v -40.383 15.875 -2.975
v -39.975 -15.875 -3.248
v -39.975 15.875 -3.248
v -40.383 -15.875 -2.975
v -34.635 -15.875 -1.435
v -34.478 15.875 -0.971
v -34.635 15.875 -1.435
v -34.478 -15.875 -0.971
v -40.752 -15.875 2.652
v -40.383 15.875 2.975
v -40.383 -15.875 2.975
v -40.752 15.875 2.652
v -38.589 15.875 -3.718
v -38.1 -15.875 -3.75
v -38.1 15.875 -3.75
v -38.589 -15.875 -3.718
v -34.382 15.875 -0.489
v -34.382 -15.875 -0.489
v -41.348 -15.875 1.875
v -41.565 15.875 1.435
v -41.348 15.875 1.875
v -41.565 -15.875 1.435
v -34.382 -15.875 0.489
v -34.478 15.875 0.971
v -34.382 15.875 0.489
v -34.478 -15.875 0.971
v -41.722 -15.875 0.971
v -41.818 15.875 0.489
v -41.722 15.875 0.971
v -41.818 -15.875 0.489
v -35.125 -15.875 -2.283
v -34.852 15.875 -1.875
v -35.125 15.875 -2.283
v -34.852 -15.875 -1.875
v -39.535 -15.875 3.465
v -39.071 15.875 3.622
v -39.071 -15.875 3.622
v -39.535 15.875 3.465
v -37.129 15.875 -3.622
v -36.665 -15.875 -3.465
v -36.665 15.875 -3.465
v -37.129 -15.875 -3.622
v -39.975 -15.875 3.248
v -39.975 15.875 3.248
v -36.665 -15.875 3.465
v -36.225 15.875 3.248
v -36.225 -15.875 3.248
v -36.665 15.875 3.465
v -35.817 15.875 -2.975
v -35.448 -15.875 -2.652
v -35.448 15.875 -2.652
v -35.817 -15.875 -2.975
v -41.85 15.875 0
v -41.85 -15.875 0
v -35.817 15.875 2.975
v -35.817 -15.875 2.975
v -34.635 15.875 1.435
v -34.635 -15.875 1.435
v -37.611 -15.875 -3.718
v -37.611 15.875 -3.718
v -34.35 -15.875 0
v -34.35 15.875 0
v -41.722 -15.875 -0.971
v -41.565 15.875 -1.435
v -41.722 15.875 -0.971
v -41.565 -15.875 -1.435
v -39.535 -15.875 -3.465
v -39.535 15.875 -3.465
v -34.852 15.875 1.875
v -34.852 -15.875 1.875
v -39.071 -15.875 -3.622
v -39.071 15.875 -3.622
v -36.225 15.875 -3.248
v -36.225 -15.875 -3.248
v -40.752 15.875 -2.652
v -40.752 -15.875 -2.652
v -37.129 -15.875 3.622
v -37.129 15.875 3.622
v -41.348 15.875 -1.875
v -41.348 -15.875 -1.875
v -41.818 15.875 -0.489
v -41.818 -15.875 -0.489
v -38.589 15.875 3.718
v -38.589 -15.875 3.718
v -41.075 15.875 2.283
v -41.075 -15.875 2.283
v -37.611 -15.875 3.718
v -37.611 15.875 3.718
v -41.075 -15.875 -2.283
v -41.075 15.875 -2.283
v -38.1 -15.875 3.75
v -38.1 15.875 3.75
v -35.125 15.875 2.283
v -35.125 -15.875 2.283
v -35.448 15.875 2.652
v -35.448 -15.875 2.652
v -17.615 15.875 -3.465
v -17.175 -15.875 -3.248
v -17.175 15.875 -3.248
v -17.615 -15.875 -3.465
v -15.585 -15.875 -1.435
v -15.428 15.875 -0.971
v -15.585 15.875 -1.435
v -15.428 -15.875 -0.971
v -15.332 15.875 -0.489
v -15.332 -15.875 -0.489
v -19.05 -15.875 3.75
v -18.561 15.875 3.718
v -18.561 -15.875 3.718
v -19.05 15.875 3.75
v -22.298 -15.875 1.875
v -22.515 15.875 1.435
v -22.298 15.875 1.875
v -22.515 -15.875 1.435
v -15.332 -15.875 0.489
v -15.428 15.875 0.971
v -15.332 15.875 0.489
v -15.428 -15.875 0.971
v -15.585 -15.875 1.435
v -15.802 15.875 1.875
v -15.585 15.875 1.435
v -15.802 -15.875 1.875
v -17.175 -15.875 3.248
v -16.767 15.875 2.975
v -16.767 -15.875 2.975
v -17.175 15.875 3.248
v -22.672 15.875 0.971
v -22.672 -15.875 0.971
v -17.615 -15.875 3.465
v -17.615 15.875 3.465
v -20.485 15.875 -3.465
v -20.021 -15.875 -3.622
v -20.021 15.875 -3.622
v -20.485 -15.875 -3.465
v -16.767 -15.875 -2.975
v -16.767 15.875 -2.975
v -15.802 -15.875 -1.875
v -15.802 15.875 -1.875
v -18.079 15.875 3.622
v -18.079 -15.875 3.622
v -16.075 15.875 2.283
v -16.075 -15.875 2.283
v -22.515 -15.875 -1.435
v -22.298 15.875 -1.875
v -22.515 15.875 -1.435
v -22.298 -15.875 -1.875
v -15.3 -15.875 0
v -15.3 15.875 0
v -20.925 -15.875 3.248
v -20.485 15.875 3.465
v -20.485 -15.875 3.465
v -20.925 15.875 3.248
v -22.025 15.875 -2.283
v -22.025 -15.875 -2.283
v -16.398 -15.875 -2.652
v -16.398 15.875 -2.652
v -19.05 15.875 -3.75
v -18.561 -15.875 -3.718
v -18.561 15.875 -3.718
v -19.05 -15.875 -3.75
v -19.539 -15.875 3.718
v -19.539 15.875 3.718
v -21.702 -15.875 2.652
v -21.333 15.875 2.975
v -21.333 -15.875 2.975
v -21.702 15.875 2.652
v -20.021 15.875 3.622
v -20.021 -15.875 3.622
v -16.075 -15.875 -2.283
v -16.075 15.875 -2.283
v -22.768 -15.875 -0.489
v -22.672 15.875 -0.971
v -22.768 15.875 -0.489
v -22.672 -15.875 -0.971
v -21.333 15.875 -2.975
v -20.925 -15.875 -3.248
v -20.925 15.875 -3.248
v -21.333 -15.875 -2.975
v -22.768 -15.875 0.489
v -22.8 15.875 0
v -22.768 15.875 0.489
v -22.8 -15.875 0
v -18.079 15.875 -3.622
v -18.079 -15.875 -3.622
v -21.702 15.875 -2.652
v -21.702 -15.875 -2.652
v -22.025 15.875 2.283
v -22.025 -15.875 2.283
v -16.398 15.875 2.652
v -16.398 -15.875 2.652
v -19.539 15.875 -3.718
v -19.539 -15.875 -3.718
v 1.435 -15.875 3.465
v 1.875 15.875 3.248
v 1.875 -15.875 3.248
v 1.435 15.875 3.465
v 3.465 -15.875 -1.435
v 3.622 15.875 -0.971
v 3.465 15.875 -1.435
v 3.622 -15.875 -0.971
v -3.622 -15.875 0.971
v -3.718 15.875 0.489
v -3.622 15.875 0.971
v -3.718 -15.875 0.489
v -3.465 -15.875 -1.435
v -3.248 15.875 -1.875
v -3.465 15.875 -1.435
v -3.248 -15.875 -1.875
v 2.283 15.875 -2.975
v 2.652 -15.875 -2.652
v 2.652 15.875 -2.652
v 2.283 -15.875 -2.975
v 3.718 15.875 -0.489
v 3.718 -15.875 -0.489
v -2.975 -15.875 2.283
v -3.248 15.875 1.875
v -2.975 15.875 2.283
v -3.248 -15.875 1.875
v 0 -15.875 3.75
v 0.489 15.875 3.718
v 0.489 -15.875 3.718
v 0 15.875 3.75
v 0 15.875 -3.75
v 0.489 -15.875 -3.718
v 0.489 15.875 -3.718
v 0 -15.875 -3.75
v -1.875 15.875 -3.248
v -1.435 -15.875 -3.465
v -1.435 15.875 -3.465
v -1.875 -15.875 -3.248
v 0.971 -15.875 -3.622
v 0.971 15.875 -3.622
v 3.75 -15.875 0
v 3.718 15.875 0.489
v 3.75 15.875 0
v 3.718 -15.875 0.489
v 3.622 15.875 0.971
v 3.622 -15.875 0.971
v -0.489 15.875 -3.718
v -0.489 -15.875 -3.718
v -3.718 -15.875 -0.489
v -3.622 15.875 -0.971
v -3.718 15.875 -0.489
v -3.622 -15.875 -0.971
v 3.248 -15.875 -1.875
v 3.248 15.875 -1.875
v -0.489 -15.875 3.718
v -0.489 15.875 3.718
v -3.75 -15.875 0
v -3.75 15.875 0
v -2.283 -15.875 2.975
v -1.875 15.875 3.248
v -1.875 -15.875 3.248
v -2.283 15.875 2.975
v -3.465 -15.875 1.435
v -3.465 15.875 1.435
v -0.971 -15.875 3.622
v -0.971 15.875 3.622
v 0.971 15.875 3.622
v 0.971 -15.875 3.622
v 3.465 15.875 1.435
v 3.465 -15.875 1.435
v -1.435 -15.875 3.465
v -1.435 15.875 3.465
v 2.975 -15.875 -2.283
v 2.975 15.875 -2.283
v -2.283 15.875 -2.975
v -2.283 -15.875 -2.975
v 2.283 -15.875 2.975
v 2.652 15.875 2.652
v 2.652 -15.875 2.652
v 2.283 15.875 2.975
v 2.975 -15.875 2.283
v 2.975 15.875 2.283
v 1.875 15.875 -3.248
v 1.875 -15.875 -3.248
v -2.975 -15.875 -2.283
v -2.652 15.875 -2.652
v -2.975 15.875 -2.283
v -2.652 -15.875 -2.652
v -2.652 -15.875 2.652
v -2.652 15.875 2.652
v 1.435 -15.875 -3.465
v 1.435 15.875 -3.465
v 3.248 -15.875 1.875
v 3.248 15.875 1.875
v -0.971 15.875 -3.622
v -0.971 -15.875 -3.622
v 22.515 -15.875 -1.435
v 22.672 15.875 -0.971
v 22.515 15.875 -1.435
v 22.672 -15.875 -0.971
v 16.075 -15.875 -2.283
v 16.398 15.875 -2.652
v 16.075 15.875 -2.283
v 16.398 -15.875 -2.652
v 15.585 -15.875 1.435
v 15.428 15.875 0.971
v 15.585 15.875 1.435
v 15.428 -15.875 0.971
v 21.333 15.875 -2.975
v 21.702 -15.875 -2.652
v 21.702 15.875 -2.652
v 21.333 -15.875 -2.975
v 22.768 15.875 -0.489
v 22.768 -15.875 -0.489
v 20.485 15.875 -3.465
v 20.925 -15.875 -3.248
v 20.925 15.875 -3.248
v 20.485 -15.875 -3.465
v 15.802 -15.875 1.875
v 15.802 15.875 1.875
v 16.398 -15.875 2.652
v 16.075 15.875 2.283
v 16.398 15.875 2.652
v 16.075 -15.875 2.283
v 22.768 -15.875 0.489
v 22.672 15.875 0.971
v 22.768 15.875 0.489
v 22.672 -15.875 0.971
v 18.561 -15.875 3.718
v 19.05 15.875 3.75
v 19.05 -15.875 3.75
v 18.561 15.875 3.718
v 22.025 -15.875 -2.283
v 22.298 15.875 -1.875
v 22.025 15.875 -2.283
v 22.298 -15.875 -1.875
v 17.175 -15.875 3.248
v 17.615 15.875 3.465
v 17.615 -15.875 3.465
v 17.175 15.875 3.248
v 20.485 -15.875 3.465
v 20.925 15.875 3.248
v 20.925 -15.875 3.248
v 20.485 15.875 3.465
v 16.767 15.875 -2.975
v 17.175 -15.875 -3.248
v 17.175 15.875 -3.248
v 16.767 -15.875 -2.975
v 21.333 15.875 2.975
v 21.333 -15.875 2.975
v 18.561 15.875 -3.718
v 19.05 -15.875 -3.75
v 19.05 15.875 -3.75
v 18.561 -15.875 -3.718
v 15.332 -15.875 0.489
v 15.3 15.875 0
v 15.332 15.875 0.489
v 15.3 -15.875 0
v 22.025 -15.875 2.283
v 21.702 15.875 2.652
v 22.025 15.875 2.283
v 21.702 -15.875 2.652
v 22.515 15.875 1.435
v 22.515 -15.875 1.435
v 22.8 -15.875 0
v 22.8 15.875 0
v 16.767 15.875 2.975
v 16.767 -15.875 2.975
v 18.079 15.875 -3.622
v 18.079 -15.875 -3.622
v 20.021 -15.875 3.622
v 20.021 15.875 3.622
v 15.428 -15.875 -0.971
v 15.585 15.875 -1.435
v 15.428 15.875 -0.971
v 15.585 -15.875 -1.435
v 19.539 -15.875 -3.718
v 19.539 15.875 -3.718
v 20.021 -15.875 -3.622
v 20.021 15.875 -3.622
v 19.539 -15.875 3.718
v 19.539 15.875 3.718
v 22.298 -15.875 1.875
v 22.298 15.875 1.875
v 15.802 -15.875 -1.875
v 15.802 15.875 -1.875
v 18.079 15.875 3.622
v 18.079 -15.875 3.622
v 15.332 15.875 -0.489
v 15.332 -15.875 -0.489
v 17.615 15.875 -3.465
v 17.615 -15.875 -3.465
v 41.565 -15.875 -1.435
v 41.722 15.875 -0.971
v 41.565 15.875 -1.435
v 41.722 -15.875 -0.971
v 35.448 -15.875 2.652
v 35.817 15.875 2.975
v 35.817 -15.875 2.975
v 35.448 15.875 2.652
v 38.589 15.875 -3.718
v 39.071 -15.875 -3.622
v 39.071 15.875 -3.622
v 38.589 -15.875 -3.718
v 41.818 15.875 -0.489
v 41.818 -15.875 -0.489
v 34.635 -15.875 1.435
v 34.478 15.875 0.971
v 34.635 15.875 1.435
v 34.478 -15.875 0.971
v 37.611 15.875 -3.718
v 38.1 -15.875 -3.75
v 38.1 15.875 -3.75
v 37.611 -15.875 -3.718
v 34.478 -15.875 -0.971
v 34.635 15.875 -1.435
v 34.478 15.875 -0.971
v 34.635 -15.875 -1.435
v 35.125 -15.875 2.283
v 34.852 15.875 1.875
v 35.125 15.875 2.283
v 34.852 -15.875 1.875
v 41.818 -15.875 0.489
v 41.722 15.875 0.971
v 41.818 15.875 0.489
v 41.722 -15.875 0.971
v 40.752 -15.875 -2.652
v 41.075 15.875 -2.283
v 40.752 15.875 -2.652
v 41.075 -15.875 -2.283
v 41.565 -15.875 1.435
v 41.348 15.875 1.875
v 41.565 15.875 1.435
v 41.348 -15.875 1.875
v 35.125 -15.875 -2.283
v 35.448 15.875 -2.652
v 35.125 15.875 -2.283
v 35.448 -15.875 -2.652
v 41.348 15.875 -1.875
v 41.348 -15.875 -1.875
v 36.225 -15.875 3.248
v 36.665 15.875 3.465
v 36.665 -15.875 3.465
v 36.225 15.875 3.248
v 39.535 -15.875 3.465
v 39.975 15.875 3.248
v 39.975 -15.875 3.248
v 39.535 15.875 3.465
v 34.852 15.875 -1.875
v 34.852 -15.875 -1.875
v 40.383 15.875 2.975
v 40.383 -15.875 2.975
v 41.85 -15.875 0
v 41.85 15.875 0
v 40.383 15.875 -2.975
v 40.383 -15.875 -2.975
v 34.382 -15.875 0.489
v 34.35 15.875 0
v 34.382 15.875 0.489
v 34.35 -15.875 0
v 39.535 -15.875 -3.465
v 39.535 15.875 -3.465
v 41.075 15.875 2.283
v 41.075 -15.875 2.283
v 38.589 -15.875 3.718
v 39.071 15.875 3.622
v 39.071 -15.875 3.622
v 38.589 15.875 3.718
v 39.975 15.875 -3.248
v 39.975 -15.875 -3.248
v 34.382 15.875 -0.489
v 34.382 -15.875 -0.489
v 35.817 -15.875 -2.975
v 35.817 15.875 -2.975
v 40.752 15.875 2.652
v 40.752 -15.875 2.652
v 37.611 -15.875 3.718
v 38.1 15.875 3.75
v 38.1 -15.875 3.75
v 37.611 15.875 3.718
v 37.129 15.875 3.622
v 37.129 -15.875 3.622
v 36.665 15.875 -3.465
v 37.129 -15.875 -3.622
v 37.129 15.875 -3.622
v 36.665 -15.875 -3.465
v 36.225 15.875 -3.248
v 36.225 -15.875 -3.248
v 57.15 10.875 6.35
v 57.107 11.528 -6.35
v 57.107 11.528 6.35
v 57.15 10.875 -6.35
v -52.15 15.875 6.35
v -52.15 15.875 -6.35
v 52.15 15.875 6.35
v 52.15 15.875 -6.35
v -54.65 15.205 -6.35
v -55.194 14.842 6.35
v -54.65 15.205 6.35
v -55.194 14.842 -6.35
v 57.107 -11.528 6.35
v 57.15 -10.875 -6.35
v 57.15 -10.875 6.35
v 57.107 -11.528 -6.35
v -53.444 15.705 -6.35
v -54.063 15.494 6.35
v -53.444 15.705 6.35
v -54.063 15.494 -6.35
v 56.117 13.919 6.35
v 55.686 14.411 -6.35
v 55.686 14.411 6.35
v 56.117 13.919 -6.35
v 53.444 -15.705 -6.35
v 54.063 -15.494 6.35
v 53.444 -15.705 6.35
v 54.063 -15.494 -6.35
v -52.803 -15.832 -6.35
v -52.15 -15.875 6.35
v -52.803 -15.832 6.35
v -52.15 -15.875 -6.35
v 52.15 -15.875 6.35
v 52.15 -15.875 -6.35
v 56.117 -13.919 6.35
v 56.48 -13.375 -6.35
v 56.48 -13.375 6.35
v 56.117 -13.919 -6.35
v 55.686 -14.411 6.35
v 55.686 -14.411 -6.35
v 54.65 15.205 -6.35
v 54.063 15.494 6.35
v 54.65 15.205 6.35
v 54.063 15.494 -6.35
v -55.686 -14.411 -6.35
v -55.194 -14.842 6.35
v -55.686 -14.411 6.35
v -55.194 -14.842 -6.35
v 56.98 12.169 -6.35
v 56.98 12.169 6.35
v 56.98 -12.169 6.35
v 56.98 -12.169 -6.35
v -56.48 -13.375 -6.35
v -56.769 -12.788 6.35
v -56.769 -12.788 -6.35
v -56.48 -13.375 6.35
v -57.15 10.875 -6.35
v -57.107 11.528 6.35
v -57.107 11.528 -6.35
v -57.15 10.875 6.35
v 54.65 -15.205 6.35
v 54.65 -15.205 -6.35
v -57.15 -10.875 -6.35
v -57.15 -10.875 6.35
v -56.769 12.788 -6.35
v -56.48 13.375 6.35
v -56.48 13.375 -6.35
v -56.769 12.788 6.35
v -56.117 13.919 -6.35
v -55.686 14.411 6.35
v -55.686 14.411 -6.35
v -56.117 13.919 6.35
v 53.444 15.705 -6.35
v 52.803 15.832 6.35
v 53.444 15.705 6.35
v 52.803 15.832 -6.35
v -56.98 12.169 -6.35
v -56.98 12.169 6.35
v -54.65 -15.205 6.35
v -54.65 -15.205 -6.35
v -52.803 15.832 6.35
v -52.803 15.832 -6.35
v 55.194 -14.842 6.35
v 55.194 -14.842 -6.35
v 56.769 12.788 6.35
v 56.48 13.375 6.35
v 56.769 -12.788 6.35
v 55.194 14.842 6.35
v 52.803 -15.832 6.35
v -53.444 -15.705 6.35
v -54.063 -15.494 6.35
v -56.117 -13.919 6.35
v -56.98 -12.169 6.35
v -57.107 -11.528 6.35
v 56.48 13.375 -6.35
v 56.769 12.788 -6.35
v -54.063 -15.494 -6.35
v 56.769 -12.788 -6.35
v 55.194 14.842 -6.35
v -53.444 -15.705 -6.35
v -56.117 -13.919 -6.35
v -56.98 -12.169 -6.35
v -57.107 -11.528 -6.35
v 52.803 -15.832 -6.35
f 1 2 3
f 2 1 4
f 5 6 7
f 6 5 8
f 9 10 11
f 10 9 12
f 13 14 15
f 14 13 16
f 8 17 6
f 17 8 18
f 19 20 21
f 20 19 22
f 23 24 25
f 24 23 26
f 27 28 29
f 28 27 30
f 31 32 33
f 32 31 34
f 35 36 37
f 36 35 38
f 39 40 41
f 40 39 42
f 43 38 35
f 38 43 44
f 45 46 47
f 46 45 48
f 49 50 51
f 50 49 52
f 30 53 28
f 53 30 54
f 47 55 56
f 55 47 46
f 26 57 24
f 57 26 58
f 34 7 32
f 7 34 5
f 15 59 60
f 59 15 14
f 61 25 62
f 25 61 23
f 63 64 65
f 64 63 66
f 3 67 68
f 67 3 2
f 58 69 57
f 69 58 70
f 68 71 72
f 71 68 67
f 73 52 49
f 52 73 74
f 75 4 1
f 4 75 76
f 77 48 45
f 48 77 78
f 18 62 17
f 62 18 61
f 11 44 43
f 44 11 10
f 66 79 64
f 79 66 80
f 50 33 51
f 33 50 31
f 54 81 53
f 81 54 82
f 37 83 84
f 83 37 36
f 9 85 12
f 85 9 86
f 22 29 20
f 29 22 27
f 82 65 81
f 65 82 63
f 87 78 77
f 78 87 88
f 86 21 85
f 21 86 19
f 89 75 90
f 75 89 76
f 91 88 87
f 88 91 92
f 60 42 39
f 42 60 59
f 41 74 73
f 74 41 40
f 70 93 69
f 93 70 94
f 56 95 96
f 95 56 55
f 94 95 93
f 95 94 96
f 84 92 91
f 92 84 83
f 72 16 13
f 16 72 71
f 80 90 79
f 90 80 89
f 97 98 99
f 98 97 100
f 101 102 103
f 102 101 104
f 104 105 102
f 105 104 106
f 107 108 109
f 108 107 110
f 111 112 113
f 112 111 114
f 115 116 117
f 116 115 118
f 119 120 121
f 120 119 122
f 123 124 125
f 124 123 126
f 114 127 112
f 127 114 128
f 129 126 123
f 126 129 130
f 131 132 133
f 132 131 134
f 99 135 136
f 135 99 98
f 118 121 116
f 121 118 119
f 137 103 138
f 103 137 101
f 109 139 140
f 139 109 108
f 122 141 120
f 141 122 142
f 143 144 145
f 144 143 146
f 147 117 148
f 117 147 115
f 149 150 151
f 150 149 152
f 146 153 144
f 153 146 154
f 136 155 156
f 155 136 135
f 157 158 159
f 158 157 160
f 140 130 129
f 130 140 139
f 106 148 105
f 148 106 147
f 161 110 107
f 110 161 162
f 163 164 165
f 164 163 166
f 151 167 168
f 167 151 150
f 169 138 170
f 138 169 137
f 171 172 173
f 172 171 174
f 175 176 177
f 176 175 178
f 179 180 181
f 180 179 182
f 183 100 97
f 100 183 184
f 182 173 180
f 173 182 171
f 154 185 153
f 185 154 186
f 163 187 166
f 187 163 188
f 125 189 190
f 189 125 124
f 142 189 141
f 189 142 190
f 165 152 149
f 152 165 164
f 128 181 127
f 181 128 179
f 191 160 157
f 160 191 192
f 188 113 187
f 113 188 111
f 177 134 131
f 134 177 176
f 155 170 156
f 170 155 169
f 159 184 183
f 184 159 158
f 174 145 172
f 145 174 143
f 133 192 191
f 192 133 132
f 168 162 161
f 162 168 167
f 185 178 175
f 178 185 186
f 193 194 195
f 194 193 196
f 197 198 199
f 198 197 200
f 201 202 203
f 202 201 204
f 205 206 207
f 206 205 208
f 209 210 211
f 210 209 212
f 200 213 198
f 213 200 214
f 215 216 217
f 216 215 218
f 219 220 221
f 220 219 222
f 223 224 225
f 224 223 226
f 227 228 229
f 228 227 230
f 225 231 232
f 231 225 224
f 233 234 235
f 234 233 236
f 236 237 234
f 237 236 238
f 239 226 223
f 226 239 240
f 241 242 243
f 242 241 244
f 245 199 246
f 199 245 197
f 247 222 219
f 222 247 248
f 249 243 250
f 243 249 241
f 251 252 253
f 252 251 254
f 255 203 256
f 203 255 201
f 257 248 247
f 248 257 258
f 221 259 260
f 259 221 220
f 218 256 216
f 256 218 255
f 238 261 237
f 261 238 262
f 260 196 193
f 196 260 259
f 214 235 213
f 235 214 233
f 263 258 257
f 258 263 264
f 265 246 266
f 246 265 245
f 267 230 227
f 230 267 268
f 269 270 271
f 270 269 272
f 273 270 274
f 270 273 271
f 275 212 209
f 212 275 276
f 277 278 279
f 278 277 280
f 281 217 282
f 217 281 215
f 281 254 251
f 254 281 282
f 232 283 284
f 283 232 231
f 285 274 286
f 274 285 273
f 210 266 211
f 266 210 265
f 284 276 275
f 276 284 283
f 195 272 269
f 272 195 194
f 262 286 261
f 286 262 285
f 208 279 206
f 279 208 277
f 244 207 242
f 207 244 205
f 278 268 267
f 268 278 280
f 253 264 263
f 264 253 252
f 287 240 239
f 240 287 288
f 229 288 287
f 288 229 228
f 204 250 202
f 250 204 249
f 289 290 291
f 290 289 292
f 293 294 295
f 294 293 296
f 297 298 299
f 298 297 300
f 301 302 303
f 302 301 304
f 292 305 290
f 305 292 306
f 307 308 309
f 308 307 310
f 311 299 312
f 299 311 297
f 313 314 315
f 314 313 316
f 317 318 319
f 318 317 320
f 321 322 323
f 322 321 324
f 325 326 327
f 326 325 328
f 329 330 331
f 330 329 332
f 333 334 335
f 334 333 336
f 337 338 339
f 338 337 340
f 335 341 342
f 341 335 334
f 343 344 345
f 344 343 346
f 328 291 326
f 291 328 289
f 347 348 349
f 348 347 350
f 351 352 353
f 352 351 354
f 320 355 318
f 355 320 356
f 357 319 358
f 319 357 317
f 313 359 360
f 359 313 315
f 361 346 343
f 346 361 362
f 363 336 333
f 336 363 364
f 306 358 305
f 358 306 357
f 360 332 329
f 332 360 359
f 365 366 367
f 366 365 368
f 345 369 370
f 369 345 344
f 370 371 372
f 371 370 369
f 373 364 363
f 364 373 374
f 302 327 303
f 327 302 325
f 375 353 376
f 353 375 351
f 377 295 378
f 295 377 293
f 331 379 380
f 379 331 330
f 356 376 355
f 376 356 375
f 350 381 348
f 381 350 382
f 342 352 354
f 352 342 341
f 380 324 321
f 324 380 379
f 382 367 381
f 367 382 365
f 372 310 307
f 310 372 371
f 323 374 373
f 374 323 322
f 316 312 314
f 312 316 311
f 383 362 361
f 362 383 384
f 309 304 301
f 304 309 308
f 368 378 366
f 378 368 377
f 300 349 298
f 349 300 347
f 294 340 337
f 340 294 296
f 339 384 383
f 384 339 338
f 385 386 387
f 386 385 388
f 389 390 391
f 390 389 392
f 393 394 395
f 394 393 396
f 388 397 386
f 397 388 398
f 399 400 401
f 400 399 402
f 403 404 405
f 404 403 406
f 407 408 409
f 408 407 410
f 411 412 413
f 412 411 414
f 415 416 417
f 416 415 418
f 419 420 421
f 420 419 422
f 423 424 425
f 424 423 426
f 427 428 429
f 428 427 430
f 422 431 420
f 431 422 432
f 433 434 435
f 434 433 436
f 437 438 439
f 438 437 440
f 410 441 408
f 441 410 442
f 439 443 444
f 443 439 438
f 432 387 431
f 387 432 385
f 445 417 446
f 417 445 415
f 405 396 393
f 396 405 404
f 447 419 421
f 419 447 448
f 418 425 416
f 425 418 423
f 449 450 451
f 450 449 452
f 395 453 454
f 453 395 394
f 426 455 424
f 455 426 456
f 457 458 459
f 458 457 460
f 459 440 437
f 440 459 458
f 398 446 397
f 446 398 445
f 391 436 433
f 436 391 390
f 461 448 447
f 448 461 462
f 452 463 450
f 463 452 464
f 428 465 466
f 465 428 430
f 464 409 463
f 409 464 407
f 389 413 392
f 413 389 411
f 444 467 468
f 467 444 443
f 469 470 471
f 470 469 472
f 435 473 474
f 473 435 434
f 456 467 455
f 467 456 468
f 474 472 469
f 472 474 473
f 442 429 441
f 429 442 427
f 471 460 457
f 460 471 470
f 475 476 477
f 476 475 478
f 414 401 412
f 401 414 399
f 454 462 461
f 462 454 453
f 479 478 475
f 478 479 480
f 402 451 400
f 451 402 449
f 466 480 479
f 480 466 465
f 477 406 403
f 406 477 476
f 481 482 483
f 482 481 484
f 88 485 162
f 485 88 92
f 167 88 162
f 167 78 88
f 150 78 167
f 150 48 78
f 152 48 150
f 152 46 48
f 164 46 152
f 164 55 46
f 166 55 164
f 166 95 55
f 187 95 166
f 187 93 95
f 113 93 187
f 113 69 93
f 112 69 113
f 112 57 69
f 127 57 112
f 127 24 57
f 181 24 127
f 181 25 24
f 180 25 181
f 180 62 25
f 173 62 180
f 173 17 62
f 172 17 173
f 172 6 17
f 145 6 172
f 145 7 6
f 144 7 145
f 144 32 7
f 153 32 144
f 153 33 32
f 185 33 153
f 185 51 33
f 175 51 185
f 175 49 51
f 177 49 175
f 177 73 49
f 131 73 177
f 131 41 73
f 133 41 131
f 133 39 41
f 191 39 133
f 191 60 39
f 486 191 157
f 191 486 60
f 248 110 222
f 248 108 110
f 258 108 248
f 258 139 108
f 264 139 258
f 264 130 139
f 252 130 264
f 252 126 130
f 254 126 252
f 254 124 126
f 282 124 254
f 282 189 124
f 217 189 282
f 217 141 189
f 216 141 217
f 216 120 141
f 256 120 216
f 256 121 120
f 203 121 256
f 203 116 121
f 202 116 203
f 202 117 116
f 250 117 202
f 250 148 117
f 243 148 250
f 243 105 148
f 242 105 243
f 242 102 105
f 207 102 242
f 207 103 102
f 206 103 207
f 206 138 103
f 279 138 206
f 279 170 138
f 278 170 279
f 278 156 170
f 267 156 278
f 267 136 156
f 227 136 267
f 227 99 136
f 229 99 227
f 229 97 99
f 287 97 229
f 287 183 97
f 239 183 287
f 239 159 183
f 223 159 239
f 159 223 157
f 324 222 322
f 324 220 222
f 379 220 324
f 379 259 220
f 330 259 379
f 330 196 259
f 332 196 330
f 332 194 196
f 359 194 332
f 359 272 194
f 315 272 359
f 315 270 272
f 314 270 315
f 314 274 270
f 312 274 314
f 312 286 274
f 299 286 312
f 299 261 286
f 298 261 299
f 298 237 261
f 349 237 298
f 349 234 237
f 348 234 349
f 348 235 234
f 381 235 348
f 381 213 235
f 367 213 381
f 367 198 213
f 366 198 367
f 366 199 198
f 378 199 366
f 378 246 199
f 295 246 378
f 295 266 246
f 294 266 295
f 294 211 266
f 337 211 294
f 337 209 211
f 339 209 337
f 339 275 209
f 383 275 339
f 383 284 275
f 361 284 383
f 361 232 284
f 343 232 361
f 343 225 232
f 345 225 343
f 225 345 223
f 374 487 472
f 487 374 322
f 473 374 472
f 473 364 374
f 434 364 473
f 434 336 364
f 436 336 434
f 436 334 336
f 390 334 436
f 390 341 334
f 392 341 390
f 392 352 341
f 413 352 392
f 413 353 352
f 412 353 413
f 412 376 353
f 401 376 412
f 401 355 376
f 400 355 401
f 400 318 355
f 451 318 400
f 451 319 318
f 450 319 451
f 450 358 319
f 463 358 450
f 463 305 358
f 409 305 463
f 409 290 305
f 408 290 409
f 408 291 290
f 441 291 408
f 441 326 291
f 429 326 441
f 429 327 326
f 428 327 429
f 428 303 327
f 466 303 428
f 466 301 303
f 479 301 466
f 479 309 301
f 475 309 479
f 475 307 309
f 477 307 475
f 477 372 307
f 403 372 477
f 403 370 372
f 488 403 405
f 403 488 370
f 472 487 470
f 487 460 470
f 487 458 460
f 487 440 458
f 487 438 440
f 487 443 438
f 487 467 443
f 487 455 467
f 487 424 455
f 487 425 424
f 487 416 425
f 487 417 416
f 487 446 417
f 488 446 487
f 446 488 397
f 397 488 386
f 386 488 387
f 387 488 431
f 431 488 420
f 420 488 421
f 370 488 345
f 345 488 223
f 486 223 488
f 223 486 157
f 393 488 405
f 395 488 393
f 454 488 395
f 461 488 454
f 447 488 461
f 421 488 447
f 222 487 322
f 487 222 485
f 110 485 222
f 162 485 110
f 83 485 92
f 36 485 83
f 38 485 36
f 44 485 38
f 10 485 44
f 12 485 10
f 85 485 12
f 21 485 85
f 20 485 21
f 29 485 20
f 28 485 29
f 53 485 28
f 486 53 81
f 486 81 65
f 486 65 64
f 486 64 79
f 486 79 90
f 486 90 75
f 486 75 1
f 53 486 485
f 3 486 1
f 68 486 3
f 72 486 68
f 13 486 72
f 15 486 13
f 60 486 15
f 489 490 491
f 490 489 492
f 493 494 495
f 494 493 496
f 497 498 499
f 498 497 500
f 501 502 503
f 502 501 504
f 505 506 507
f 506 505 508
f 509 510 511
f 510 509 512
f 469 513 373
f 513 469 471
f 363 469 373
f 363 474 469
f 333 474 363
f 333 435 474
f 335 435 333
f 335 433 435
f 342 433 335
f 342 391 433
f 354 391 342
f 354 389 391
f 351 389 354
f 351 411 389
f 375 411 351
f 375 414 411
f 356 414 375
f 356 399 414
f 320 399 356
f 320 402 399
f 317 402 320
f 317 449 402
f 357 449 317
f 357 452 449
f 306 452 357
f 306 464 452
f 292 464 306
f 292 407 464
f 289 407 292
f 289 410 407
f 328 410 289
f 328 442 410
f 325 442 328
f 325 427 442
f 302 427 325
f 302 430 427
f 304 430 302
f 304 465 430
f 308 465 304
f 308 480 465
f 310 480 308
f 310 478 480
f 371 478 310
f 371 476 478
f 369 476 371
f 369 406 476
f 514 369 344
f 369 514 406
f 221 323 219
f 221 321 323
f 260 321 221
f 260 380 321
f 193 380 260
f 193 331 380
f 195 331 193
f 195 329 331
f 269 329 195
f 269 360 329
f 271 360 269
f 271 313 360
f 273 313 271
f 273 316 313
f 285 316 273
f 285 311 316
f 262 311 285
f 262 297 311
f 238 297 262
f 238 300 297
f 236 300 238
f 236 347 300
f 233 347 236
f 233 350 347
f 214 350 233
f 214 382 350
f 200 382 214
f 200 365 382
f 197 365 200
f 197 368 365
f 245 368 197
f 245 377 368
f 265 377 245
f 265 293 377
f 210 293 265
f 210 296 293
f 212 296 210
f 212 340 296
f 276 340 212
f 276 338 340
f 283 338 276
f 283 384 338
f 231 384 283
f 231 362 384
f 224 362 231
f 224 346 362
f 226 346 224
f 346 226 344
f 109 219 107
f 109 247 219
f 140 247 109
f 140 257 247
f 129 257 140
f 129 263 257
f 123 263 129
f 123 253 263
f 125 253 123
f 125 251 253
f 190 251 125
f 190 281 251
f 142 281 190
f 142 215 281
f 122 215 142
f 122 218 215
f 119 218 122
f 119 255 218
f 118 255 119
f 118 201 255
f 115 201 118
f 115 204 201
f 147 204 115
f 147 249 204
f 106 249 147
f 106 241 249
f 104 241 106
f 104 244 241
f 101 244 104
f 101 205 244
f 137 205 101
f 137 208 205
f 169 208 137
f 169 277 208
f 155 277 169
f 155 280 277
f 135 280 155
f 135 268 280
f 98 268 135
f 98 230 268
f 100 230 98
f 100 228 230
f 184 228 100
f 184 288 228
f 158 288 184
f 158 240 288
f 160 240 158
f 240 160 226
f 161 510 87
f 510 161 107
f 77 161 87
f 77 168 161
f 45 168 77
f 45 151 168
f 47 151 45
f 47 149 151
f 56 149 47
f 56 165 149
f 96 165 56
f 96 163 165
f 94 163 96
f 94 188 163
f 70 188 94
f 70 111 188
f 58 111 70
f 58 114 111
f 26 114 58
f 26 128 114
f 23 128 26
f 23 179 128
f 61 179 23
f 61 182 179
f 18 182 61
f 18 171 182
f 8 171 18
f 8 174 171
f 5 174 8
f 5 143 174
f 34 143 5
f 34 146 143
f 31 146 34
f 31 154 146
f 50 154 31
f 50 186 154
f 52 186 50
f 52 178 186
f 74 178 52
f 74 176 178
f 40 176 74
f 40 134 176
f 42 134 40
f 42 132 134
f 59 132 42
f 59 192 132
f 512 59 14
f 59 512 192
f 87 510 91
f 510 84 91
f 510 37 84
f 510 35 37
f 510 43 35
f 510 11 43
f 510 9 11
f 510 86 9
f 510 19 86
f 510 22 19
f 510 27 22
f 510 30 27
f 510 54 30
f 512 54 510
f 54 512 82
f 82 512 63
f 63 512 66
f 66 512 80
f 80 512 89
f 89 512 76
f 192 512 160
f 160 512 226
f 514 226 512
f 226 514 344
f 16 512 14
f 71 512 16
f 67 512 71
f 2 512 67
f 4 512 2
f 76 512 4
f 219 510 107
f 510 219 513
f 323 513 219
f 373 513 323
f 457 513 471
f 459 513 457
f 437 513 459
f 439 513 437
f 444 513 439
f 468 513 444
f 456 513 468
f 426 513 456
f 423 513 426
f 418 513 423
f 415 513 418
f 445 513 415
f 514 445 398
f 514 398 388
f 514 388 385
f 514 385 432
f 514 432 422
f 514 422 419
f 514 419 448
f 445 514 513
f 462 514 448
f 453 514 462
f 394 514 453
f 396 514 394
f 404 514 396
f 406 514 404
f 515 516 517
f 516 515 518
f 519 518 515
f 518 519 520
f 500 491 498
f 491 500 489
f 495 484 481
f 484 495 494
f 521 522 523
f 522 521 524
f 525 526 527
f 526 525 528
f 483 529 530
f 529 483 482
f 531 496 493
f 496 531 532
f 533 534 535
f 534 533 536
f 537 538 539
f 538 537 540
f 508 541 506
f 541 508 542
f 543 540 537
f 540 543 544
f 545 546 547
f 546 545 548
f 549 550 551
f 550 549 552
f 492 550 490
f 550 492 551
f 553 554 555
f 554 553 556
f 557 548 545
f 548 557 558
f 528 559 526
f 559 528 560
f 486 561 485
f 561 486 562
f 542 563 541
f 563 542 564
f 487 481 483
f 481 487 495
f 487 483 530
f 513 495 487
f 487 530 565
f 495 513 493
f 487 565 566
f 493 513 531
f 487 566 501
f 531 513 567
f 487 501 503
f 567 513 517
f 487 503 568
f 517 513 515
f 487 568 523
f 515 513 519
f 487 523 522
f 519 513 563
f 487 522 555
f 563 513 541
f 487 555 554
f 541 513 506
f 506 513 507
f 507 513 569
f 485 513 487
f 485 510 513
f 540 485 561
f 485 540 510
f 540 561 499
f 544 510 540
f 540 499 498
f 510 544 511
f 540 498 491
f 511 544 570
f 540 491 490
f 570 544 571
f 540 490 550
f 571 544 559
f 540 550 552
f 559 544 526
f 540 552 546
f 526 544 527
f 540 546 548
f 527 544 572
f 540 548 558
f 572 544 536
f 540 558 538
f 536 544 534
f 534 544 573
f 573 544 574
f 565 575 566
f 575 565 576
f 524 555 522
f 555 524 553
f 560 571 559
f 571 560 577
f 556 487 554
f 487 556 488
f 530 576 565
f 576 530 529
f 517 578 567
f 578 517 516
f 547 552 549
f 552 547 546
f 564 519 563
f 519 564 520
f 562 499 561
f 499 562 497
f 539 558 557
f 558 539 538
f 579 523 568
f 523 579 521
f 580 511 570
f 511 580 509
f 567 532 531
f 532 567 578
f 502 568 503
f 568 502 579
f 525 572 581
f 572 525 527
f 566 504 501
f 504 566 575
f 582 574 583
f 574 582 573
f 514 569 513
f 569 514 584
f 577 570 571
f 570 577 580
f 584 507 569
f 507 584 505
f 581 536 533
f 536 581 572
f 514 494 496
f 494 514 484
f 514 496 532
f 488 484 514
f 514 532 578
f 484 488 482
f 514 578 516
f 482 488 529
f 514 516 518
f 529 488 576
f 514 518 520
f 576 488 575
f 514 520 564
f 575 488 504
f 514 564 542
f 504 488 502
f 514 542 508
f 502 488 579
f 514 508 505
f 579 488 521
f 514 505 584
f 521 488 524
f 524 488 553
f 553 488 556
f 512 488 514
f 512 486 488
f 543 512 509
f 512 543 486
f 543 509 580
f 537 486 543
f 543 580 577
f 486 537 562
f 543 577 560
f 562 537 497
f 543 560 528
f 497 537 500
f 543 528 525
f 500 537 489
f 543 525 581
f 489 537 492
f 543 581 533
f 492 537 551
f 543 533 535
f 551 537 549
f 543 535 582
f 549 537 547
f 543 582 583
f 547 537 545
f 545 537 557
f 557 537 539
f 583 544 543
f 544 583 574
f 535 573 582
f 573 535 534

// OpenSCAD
// file: ../lib/TOGMod1Constructors.scad
// TOGMod1Constructors-v1.7
// 
// Functions to construct objects understood by TOGMod1
// 
// v1.1:
// - Add togmod1_make_rounded_rect
// v1.2:
// - togmod1_make_rounded_rect can make ovals
// v1.3:
// - togmod1_circle_points, to just get the points of a circle
// - if pos parameter to circle function has a third element,
//   returned vertexes will include it as the z component;
// v1.3.1
// - Some assertions
// v1.4:
// - Refactor togmod1_rounded_rect_points and togmod1_circle_points
//   to use togmod1__make_nd_vector_adder for adapting to whatever
//   `pos` parameter is.
// v1.5:
// - togmod_rounded_rect_points will not simplify completely rounded sides
//   (where length of side is exactly twice the rounding radius)
//   unless simplify_rounded_sides=true
//   - This makes it more useful for polyhedron generation,
//     where radius varies, but number of points must remain constant.
// v1.6:
// - togmod1_make_rect makes a simple rectangle
// - togmod1_make_rounded_rect will defer to togmod1_make_rect when r=0
// v1.7:
// - togmod1_make_circle will return empty shape (["union"]) when d=0

use <./TOGArrayLib1.scad>

function togmod1__make_nd_vector_adder(origin=[0,0]) =
	let(origin_is_zero = tal1_reduce(true, origin, function(prev,item) prev && item == 0))
	origin_is_zero ? (function(vec) len(vec) >= len(origin) ? vec : tal1_replace_at(origin, 0, vec)) :
	function(vec) [
		for(i=[0:1:max(len(origin),len(vec))-1]) (len(vec) > i ? vec[i] : 0) + (len(origin) > i ? origin[i] : 0),
	];

assert([1,2,3] == togmod1__make_nd_vector_adder()([1,2,3]));
echo(togmod1__make_nd_vector_adder([0,0,3])([1,2]));
assert([1,2,3] == togmod1__make_nd_vector_adder([0,0,3])([1,2]));


function togmod1_make_cuboid(size) =
	assert(is_list(size))
	assert(len(size) >= 3)
	assert(is_num(size[0]))
	assert(is_num(size[1]))
	assert(is_num(size[2]))
	["polyhedron-vf", [
		[-size[0]/2, -size[1]/2, -size[2]/2],
		[+size[0]/2, -size[1]/2, -size[2]/2],
		[-size[0]/2, +size[1]/2, -size[2]/2],
		[+size[0]/2, +size[1]/2, -size[2]/2],
		[-size[0]/2, -size[1]/2, +size[2]/2],
		[+size[0]/2, -size[1]/2, +size[2]/2],
		[-size[0]/2, +size[1]/2, +size[2]/2],
		[+size[0]/2, +size[1]/2, +size[2]/2]
	], [
		[0,1,3,2],[0,4,5,1],[4,6,7,5],[3,7,6,2],[1,5,7,3],[6,4,0,2]
	]];

function togmod1_make_polygon(verts) =
	["polygon-vp", verts, [[for( i=[0:1:len(verts)-1] ) i%len(verts)]]];

function togmod1_rounded_rect_points(size, r, pos=[0,0], simplify_rounded_sides=false) =
	assert(is_list(size))
	assert(len(size) >= 2)
	let(radii = is_list(r) ? r : is_num(r) ? [r,r] : assert(false, "rounded_rect r(adius) should be list<num> or num"))
	let(rx = radii[0])
	let(ry = radii[1])
	assert(is_num(rx))
	assert(is_num(ry))
	assert(size[0] >= 2*rx, str("size[0] must be >= 2*r[0]; size[0] = ",size[0],", 2*r[0] = ",2*rx))
	assert(size[1] >= 2*ry, str("size[1] must be >= 2*r[1]; size[1] = ",size[1],", 2*r[1] = ",2*ry))
	let(quarterfn=max($fn/4, 1))
	let(qfnx = simplify_rounded_sides && size[0] == 2*rx ? quarterfn-1 : quarterfn)
	let(qfny = simplify_rounded_sides && size[1] == 2*ry ? quarterfn-1 : quarterfn)
	let(finalizepos = togmod1__make_nd_vector_adder(pos))
[
	for(a=[0 : 1 : qfnx]) let(ang=      a*90/quarterfn) finalizepos([ size[0]/2-rx + rx*cos(ang),  size[1]/2-ry + ry*sin(ang)]),
	for(a=[0 : 1 : qfny]) let(ang= 90 + a*90/quarterfn) finalizepos([-size[0]/2+rx + rx*cos(ang),  size[1]/2-ry + ry*sin(ang)]),
	for(a=[0 : 1 : qfnx]) let(ang=180 + a*90/quarterfn) finalizepos([-size[0]/2+rx + rx*cos(ang), -size[1]/2+ry + ry*sin(ang)]),
	for(a=[0 : 1 : qfny]) let(ang=270 + a*90/quarterfn) finalizepos([ size[0]/2-rx + rx*cos(ang), -size[1]/2+ry + ry*sin(ang)]),
];

function togmod1_make_rect(size) =
	togmod1_make_polygon([
		[-size[0]/2, -size[1]/2],
		[+size[0]/2, -size[1]/2],
		[+size[0]/2, +size[1]/2],
		[-size[0]/2, +size[1]/2],
	]);

function togmod1_make_rounded_rect(size, r) =
	r == 0 ? togmod1_make_rect(size) :
	togmod1_make_polygon(togmod1_rounded_rect_points(size,r,simplify_rounded_sides=true));

function togmod1_circle_points(r, pos=[0,0], d=undef) =
	assert( !is_undef(r) || !is_undef(d) )
	assert(!is_undef(pos[0]))
	assert(!is_undef(pos[1]))
	let(finalizepos = togmod1__make_nd_vector_adder(pos))
	let(r_ = !is_undef(r) ? r : d/2)
	let(fn = max($fn, 6))
	[for(i=[0 : 1 : fn-1]) finalizepos([r_*cos(i*360/fn), r_*sin(i*360/fn)])];

function togmod1_make_circle(r, pos=[0,0], d=undef) =
	r == 0 || d == 0 ? ["union"] :
	togmod1_make_polygon(togmod1_circle_points(r=r, pos=pos, d=d));

function togmod1_make_cylinder(d, zrange=[0,1], r=undef, pos=[0,0]) =
	assert( !is_undef(r) || !is_undef(d) )
	let( r_ = !is_undef(r) ? r : d/2 )
	// TODO: Make polyhedron directly
	["linear-extrude-zs", zrange, togmod1_make_circle(r=r_, pos=pos)];

function togmod1__is_range1d(range) = is_list(range) && len(range) == 2 && is_num(range[0]) && is_num(range[1]);

function togmod1_linear_extrude_z(range, shape) =
	assert(togmod1__is_range1d(range))
	["linear-extrude-zs", range, shape];
function togmod1_linear_extrude_x(range, shape) =
	assert(togmod1__is_range1d(range))
	["rotate", [90, 0, 90], togmod1_linear_extrude_z(range, shape)];
function togmod1_linear_extrude_y(range, shape) =
	assert(togmod1__is_range1d(range))
	["rotate", [90, 0, 180], togmod1_linear_extrude_z(range, shape)];
// file: ../lib/TOGArrayLib1.scad
// TOGArrayLib1.4
// 
// Functions for working with arrays.
// 
// v1.1:
// - tal1_reduce assert(is_list(items)) to prevent infinite recursion
//   when given undefined or other non-list values
// v1.1.1:
// - Fix tal1_uniq_remap_v2 to return "list-remap-result" as the
//   first element of the returned list
// v1.2:
// - Add tal1_replace_at function
// v1.3:
// - tal1_is_vec_of, tal1_is_vec_of_num
// v1.4:
// - tal1_assert_for_each, for when you want to assert something
//   about each of a list of items and get nice failure messages

/**
 * Make a list with the contents of list `a`,
 * but starting at offset `off`, replaced by the contents of list `b`.
 * len(result) = max(len(a), off+len(b))
 */
function tal1_replace_at(a, off, b, default_value=undef, default_value_function=undef) =
	assert(is_list(a))
	assert(is_list(b))
	let( _dvf = !is_undef(default_value_function) ? default_value_function : function(i) default_value )
[
	for( i=[0:1:min(off,len(a))-1] ) a[i],
	for( i=[len(a):1:off-1] ) _dvf(i),
	for( i=[off:1:off+len(b)-1] ) b[i-off],
	for( i=[off+len(b):1:len(a)-1] ) a[i],
];

// Simplest case
assert([] == tal1_replace_at([], 0, []));
// Second simplest cases
assert(["foo"] == tal1_replace_at(["foo"], 0, []));
assert(["foo"] == tal1_replace_at([], 0, ["foo"]));
// Replace one item
assert(["foo","quux","baz"] == tal1_replace_at(["foo","bar","baz"], 1, ["quux"]));
// Replace and extend
assert(["foo","quux","tuna","tina"] == tal1_replace_at(["foo","bar","baz"], 1, ["quux", "tuna", "tina"]));
// Add beyond end of `a`
assert(["foo","zzz","quux"] == tal1_replace_at(["foo"], 2, ["quux"], default_value="zzz"));
// Adding 'nothing' should still fill to that point with defaults
assert(["foo","zzz","zzz"] == tal1_replace_at(["foo"], 3, [], default_value="zzz"));


function tal1_reduce(start, items, func, offset=0) =
	assert(is_list(items))
	len(items) == offset ? start :
	tal1_reduce(func(start, items[offset]), items, func, offset+1);

function tal1_consecutive_duplicate_count(items) = tal1_reduce(
	[0, undef],
	items,
	function(z,item) [z[0] + (item == z[1] ? 1 : 0), item]
)[0];

assert(0 == tal1_consecutive_duplicate_count([]));
assert(0 == tal1_consecutive_duplicate_count([50]));
assert(1 == tal1_consecutive_duplicate_count([50,50]));
assert(0 == tal1_consecutive_duplicate_count([50,51,52,53]));
assert(1 == tal1_consecutive_duplicate_count([50,51,52,52]));
assert(3 == tal1_consecutive_duplicate_count([50,50,50,50]));

// Set test_size to arbirarily large values
// to ensure that OpenSCAD can handle heavy recursion
let(test_size=1000) assert(test_size/2 == tal1_consecutive_duplicate_count([for(i=[0:1:test_size-1]) floor(i/2)]));



function tal1_uniq_(items, off0, off1) =
	let(chunklen = off1-off0)
	chunklen == 0 ? [] :
	chunklen == 1 ? [items[off0]] :
	let(half=floor(chunklen/2))
	let(left  = tal1_uniq_(items, off0     , off0+half))
	let(right = tal1_uniq_(items, off0+half, off1     ))
	assert(len(left) > 0)
	assert(len(right) > 0)
	left[len(left)-1] == right[0] ? [each left, for(i=[1:1:len(right)-1]) right[i]] :
	[each left, each right];

/** Given a list of items, returns a new list with identical consecutive items merged */
function tal1_uniq(items) = tal1_uniq_(items, 0, len(items));

assert([] == tal1_uniq([]));
assert([123] == tal1_uniq([123]));
assert([55,0,1,2,3] == tal1_uniq([55,0,1,2,3]));
assert([55,0,1,2] == tal1_uniq([55,0,1,1,2]));
assert([55,0,1] == tal1_uniq([55,55,0,0,0,0,0,0,1,1,1,1]));
assert([55,0] == tal1_uniq([55,0,0,0,0,0,0,0]));



/**
 * Returns [new items, old index -> new index mapping].
 * No-op version.
 */
function tal1_uniq_remap_v1(items) =
	["list-remap-result", items, [for (vi=[0:1:len(items)-1]) vi]];

// [a, a, b, b, c, c]
//
// [a,    ...], []  -> [a],[0]
// [a, a, ...], [0] -> [a],[0,0]

assert([1,2,3] == [1,2,3]);

/**
 * Recursive version that will combine adjacent identical vertexes,
 * but will use the original items.
 */
function tal1_uniq_remap_v2(items, map=[]) =
	let(index = len(map))
	len(items) == index ? ["list-remap-result", items, map] :
	index == 0 ? tal1_uniq_remap_v2(items, [0]) :
	items[index] == items[map[index-1]] ? tal1_uniq_remap_v2(items, [for(vi=map) vi, map[index-1]]) :
	tal1_uniq_remap_v2(items, [for(vi=map) vi, index]);

assert(tal1_uniq_remap_v2([1,1,2,2,3,4]) == ["list-remap-result", [1,1,2,2,3,4], [0,0,2,2,4,5]]);


/**
 * Returns true if `vec` is a list of at least min_len items
 * and component_check(each item, even those beyond min_len) is true.
 */
function tal1_is_vec_of(vec, min_len=0, component_check=function(x) true) =
	assert(is_num(min_len) && min_len >= 0)
	assert(is_function(component_check))
	is_list(vec) && len(vec) >= min_len &&
	tal1_reduce(true, vec, function(prev,item) prev && component_check(item));

function tal1_is_vec_of_num(vec, min_len=0) = tal1_is_vec_of(vec, min_len, function(i) is_num(i));

assert( true == tal1_is_vec_of_num([1,2,3]));
assert( true == tal1_is_vec_of_num([]));
assert( true == tal1_is_vec_of_num([1,2,3], 3));
assert(false == tal1_is_vec_of_num([1,2], 3));
assert(false == tal1_is_vec_of_num([1,2,"spoon"], 3));
// Requirements are ambiguous when
// first min_len items are numbers, but there are non-numeric items afterwards,
// so let's error on the side of saying 'no, it's not a list of numbers';
// i.e. the item check and the min_len are independent.
assert(false == tal1_is_vec_of_num([1,2,3,"artichoke"], 3));


/**
 * Asserts that item_checker(each item in list, index of item)[0] is true.
 * Second element of item_checker return value is assertion message.
 * Returns the original list, in case that's useful to you.
 */
function tal1_assert_for_each(list, item_checker) =
	let( _ignored = [ for(i=[0:1:len(list)-1])
		let(q=item_checker(list[i],i))
		let(passed=is_bool(q) ? q : is_list(q) ? q[0] : assert(false, str(
			"tal1_assert_for_each: item_checker should return Bool|[Bool,String], but returned ",
			q, " for item at index ", i)))
		let(message=is_list(q) ? q[1] : undef)
		assert(passed, message)
		q
	])
	list;

// Callback can return a boolean...
assert([1,2,3] == tal1_assert_for_each([1,2,3], function(v,i) is_num(v)));
// ...or a [boolean, string]
assert([1,2,3] == tal1_assert_for_each([1,2,3], function(v,i) [is_num(v), "element be a num"]));
// file: ../lib/TOGMod1.scad
// TOGMod1
// OpenSCAD library for representing shapes
// 
// See also: Functional OpenSCAD (https://github.com/thehans/FunctionalOpenSCAD)

module togmod1_domodule(mod) {
	assert(is_list(mod));
	assert(len(mod) > 0);
	if( mod[0] == "polygon-vp" ) {
		// ["polygon-vp", vertexes, paths]
		polygon(points=mod[1], paths=mod[2]);
	} else if( mod[0] == "polyhedron-vf" ) {
		polyhedron(mod[1], faces=mod[2]);
	} else if( mod[0] == "scale" ) {
		assert(len(mod) == 3);
		scale(mod[1]) togmod1_domodule(mod[2]);
	} else if( mod[0] == "translate" ) {
		assert(len(mod) == 3);
		assert(is_list(mod[1]));
		for(c=mod[1]) assert(is_num(c), "translate component should be numeric");
		translate(mod[1]) togmod1_domodule(mod[2]);
	} else if( mod[0] == "rotate" ) {
		assert(len(mod) == 3);
		rotate(mod[1]) togmod1_domodule(mod[2]);
	} else if( mod[0] == "intersection" ) {
		intersection_for( i=[1:1:len(mod)-1] ) togmod1_domodule(mod[i]);
	} else if( mod[0] == "difference" ) {
		difference() {
			togmod1_domodule(mod[1]);
			for( i=[2:1:len(mod)-1] ) togmod1_domodule(mod[i]);
		}
	} else if( mod[0] == "union" ) {
		for( i=[1:1:len(mod)-1] ) togmod1_domodule(mod[i]);
	} else if( mod[0] == "hull" ) {
		hull() for( i=[1:1:len(mod)-1] ) togmod1_domodule(mod[i]);
	} else if( mod[0] == "offset-rs" ) {
		assert(len(mod) == 3);
		assert(is_num(mod[1]));
		assert(is_list(mod[2]));
		offset(mod[1]) togmod1_domodule(mod[2]);
	} else if( mod[0] == "linear-extrude-zs" ) {
		// ["linear-extrude-zs", [z0,z1], 2d_shape] // centered
		// ["linear-extrude-zs", height, 2d_shape]
		let( zrange = is_list(mod[1]) ? mod[1] : [-mod[1]/2, mod[1]/2] ) {
			translate([0,0,zrange[0]]) linear_extrude(zrange[1]-zrange[0]) togmod1_domodule(mod[2]);
		}
	} else if( mod[0] == "render" ) {
		render() togmod1_domodule(mod[1]);
	} else if( mod[0] == "minkowski" ) {
		minkowski() {
			togmod1_domodule(mod[1]);
			togmod1_domodule(mod[2]);
		}
	} else if( mod[0] == "x-debug" ) {
		# togmod1_domodule(mod[1]);
	} else if( mod[0] == "x-color" ) {
		color(mod[1]) togmod1_domodule(mod[2]);
	} else {
		assert(false, str("Unrecognized shape: ", mod[0]));
	}
}
// main file
// KhkhkhtSpacer1.0
// 
// For jamming between Pepsi panels and the Pepsi panel ceiling rail

length_chunks = 3;
width = 31.75;
height = 12.7;
hole_diameter = 7.5;
$fn = 48;

module __khkhkhtspacer1__end_params() { }

use <../lib/TOGMod1.scad>
use <../lib/TOGPolyhedronLib1.scad>

togmod1_domodule(
	let( inch = 25.4 )
	let( chunk = 38.1 )
	let( hole = ["rotate", [90,0,0], tphl1_make_z_cylinder(zrange=[-width, +width], d=hole_diameter)] )
	["difference",
		tphl1_make_rounded_cuboid([length_chunks*chunk, width, height], r=[5,5,0]),
		
		for( xm=[-length_chunks/2 + 0.5 : 0.5 : length_chunks/2-0.5] )
		["translate", [xm*chunk, 0, 0], hole],
	]
);
